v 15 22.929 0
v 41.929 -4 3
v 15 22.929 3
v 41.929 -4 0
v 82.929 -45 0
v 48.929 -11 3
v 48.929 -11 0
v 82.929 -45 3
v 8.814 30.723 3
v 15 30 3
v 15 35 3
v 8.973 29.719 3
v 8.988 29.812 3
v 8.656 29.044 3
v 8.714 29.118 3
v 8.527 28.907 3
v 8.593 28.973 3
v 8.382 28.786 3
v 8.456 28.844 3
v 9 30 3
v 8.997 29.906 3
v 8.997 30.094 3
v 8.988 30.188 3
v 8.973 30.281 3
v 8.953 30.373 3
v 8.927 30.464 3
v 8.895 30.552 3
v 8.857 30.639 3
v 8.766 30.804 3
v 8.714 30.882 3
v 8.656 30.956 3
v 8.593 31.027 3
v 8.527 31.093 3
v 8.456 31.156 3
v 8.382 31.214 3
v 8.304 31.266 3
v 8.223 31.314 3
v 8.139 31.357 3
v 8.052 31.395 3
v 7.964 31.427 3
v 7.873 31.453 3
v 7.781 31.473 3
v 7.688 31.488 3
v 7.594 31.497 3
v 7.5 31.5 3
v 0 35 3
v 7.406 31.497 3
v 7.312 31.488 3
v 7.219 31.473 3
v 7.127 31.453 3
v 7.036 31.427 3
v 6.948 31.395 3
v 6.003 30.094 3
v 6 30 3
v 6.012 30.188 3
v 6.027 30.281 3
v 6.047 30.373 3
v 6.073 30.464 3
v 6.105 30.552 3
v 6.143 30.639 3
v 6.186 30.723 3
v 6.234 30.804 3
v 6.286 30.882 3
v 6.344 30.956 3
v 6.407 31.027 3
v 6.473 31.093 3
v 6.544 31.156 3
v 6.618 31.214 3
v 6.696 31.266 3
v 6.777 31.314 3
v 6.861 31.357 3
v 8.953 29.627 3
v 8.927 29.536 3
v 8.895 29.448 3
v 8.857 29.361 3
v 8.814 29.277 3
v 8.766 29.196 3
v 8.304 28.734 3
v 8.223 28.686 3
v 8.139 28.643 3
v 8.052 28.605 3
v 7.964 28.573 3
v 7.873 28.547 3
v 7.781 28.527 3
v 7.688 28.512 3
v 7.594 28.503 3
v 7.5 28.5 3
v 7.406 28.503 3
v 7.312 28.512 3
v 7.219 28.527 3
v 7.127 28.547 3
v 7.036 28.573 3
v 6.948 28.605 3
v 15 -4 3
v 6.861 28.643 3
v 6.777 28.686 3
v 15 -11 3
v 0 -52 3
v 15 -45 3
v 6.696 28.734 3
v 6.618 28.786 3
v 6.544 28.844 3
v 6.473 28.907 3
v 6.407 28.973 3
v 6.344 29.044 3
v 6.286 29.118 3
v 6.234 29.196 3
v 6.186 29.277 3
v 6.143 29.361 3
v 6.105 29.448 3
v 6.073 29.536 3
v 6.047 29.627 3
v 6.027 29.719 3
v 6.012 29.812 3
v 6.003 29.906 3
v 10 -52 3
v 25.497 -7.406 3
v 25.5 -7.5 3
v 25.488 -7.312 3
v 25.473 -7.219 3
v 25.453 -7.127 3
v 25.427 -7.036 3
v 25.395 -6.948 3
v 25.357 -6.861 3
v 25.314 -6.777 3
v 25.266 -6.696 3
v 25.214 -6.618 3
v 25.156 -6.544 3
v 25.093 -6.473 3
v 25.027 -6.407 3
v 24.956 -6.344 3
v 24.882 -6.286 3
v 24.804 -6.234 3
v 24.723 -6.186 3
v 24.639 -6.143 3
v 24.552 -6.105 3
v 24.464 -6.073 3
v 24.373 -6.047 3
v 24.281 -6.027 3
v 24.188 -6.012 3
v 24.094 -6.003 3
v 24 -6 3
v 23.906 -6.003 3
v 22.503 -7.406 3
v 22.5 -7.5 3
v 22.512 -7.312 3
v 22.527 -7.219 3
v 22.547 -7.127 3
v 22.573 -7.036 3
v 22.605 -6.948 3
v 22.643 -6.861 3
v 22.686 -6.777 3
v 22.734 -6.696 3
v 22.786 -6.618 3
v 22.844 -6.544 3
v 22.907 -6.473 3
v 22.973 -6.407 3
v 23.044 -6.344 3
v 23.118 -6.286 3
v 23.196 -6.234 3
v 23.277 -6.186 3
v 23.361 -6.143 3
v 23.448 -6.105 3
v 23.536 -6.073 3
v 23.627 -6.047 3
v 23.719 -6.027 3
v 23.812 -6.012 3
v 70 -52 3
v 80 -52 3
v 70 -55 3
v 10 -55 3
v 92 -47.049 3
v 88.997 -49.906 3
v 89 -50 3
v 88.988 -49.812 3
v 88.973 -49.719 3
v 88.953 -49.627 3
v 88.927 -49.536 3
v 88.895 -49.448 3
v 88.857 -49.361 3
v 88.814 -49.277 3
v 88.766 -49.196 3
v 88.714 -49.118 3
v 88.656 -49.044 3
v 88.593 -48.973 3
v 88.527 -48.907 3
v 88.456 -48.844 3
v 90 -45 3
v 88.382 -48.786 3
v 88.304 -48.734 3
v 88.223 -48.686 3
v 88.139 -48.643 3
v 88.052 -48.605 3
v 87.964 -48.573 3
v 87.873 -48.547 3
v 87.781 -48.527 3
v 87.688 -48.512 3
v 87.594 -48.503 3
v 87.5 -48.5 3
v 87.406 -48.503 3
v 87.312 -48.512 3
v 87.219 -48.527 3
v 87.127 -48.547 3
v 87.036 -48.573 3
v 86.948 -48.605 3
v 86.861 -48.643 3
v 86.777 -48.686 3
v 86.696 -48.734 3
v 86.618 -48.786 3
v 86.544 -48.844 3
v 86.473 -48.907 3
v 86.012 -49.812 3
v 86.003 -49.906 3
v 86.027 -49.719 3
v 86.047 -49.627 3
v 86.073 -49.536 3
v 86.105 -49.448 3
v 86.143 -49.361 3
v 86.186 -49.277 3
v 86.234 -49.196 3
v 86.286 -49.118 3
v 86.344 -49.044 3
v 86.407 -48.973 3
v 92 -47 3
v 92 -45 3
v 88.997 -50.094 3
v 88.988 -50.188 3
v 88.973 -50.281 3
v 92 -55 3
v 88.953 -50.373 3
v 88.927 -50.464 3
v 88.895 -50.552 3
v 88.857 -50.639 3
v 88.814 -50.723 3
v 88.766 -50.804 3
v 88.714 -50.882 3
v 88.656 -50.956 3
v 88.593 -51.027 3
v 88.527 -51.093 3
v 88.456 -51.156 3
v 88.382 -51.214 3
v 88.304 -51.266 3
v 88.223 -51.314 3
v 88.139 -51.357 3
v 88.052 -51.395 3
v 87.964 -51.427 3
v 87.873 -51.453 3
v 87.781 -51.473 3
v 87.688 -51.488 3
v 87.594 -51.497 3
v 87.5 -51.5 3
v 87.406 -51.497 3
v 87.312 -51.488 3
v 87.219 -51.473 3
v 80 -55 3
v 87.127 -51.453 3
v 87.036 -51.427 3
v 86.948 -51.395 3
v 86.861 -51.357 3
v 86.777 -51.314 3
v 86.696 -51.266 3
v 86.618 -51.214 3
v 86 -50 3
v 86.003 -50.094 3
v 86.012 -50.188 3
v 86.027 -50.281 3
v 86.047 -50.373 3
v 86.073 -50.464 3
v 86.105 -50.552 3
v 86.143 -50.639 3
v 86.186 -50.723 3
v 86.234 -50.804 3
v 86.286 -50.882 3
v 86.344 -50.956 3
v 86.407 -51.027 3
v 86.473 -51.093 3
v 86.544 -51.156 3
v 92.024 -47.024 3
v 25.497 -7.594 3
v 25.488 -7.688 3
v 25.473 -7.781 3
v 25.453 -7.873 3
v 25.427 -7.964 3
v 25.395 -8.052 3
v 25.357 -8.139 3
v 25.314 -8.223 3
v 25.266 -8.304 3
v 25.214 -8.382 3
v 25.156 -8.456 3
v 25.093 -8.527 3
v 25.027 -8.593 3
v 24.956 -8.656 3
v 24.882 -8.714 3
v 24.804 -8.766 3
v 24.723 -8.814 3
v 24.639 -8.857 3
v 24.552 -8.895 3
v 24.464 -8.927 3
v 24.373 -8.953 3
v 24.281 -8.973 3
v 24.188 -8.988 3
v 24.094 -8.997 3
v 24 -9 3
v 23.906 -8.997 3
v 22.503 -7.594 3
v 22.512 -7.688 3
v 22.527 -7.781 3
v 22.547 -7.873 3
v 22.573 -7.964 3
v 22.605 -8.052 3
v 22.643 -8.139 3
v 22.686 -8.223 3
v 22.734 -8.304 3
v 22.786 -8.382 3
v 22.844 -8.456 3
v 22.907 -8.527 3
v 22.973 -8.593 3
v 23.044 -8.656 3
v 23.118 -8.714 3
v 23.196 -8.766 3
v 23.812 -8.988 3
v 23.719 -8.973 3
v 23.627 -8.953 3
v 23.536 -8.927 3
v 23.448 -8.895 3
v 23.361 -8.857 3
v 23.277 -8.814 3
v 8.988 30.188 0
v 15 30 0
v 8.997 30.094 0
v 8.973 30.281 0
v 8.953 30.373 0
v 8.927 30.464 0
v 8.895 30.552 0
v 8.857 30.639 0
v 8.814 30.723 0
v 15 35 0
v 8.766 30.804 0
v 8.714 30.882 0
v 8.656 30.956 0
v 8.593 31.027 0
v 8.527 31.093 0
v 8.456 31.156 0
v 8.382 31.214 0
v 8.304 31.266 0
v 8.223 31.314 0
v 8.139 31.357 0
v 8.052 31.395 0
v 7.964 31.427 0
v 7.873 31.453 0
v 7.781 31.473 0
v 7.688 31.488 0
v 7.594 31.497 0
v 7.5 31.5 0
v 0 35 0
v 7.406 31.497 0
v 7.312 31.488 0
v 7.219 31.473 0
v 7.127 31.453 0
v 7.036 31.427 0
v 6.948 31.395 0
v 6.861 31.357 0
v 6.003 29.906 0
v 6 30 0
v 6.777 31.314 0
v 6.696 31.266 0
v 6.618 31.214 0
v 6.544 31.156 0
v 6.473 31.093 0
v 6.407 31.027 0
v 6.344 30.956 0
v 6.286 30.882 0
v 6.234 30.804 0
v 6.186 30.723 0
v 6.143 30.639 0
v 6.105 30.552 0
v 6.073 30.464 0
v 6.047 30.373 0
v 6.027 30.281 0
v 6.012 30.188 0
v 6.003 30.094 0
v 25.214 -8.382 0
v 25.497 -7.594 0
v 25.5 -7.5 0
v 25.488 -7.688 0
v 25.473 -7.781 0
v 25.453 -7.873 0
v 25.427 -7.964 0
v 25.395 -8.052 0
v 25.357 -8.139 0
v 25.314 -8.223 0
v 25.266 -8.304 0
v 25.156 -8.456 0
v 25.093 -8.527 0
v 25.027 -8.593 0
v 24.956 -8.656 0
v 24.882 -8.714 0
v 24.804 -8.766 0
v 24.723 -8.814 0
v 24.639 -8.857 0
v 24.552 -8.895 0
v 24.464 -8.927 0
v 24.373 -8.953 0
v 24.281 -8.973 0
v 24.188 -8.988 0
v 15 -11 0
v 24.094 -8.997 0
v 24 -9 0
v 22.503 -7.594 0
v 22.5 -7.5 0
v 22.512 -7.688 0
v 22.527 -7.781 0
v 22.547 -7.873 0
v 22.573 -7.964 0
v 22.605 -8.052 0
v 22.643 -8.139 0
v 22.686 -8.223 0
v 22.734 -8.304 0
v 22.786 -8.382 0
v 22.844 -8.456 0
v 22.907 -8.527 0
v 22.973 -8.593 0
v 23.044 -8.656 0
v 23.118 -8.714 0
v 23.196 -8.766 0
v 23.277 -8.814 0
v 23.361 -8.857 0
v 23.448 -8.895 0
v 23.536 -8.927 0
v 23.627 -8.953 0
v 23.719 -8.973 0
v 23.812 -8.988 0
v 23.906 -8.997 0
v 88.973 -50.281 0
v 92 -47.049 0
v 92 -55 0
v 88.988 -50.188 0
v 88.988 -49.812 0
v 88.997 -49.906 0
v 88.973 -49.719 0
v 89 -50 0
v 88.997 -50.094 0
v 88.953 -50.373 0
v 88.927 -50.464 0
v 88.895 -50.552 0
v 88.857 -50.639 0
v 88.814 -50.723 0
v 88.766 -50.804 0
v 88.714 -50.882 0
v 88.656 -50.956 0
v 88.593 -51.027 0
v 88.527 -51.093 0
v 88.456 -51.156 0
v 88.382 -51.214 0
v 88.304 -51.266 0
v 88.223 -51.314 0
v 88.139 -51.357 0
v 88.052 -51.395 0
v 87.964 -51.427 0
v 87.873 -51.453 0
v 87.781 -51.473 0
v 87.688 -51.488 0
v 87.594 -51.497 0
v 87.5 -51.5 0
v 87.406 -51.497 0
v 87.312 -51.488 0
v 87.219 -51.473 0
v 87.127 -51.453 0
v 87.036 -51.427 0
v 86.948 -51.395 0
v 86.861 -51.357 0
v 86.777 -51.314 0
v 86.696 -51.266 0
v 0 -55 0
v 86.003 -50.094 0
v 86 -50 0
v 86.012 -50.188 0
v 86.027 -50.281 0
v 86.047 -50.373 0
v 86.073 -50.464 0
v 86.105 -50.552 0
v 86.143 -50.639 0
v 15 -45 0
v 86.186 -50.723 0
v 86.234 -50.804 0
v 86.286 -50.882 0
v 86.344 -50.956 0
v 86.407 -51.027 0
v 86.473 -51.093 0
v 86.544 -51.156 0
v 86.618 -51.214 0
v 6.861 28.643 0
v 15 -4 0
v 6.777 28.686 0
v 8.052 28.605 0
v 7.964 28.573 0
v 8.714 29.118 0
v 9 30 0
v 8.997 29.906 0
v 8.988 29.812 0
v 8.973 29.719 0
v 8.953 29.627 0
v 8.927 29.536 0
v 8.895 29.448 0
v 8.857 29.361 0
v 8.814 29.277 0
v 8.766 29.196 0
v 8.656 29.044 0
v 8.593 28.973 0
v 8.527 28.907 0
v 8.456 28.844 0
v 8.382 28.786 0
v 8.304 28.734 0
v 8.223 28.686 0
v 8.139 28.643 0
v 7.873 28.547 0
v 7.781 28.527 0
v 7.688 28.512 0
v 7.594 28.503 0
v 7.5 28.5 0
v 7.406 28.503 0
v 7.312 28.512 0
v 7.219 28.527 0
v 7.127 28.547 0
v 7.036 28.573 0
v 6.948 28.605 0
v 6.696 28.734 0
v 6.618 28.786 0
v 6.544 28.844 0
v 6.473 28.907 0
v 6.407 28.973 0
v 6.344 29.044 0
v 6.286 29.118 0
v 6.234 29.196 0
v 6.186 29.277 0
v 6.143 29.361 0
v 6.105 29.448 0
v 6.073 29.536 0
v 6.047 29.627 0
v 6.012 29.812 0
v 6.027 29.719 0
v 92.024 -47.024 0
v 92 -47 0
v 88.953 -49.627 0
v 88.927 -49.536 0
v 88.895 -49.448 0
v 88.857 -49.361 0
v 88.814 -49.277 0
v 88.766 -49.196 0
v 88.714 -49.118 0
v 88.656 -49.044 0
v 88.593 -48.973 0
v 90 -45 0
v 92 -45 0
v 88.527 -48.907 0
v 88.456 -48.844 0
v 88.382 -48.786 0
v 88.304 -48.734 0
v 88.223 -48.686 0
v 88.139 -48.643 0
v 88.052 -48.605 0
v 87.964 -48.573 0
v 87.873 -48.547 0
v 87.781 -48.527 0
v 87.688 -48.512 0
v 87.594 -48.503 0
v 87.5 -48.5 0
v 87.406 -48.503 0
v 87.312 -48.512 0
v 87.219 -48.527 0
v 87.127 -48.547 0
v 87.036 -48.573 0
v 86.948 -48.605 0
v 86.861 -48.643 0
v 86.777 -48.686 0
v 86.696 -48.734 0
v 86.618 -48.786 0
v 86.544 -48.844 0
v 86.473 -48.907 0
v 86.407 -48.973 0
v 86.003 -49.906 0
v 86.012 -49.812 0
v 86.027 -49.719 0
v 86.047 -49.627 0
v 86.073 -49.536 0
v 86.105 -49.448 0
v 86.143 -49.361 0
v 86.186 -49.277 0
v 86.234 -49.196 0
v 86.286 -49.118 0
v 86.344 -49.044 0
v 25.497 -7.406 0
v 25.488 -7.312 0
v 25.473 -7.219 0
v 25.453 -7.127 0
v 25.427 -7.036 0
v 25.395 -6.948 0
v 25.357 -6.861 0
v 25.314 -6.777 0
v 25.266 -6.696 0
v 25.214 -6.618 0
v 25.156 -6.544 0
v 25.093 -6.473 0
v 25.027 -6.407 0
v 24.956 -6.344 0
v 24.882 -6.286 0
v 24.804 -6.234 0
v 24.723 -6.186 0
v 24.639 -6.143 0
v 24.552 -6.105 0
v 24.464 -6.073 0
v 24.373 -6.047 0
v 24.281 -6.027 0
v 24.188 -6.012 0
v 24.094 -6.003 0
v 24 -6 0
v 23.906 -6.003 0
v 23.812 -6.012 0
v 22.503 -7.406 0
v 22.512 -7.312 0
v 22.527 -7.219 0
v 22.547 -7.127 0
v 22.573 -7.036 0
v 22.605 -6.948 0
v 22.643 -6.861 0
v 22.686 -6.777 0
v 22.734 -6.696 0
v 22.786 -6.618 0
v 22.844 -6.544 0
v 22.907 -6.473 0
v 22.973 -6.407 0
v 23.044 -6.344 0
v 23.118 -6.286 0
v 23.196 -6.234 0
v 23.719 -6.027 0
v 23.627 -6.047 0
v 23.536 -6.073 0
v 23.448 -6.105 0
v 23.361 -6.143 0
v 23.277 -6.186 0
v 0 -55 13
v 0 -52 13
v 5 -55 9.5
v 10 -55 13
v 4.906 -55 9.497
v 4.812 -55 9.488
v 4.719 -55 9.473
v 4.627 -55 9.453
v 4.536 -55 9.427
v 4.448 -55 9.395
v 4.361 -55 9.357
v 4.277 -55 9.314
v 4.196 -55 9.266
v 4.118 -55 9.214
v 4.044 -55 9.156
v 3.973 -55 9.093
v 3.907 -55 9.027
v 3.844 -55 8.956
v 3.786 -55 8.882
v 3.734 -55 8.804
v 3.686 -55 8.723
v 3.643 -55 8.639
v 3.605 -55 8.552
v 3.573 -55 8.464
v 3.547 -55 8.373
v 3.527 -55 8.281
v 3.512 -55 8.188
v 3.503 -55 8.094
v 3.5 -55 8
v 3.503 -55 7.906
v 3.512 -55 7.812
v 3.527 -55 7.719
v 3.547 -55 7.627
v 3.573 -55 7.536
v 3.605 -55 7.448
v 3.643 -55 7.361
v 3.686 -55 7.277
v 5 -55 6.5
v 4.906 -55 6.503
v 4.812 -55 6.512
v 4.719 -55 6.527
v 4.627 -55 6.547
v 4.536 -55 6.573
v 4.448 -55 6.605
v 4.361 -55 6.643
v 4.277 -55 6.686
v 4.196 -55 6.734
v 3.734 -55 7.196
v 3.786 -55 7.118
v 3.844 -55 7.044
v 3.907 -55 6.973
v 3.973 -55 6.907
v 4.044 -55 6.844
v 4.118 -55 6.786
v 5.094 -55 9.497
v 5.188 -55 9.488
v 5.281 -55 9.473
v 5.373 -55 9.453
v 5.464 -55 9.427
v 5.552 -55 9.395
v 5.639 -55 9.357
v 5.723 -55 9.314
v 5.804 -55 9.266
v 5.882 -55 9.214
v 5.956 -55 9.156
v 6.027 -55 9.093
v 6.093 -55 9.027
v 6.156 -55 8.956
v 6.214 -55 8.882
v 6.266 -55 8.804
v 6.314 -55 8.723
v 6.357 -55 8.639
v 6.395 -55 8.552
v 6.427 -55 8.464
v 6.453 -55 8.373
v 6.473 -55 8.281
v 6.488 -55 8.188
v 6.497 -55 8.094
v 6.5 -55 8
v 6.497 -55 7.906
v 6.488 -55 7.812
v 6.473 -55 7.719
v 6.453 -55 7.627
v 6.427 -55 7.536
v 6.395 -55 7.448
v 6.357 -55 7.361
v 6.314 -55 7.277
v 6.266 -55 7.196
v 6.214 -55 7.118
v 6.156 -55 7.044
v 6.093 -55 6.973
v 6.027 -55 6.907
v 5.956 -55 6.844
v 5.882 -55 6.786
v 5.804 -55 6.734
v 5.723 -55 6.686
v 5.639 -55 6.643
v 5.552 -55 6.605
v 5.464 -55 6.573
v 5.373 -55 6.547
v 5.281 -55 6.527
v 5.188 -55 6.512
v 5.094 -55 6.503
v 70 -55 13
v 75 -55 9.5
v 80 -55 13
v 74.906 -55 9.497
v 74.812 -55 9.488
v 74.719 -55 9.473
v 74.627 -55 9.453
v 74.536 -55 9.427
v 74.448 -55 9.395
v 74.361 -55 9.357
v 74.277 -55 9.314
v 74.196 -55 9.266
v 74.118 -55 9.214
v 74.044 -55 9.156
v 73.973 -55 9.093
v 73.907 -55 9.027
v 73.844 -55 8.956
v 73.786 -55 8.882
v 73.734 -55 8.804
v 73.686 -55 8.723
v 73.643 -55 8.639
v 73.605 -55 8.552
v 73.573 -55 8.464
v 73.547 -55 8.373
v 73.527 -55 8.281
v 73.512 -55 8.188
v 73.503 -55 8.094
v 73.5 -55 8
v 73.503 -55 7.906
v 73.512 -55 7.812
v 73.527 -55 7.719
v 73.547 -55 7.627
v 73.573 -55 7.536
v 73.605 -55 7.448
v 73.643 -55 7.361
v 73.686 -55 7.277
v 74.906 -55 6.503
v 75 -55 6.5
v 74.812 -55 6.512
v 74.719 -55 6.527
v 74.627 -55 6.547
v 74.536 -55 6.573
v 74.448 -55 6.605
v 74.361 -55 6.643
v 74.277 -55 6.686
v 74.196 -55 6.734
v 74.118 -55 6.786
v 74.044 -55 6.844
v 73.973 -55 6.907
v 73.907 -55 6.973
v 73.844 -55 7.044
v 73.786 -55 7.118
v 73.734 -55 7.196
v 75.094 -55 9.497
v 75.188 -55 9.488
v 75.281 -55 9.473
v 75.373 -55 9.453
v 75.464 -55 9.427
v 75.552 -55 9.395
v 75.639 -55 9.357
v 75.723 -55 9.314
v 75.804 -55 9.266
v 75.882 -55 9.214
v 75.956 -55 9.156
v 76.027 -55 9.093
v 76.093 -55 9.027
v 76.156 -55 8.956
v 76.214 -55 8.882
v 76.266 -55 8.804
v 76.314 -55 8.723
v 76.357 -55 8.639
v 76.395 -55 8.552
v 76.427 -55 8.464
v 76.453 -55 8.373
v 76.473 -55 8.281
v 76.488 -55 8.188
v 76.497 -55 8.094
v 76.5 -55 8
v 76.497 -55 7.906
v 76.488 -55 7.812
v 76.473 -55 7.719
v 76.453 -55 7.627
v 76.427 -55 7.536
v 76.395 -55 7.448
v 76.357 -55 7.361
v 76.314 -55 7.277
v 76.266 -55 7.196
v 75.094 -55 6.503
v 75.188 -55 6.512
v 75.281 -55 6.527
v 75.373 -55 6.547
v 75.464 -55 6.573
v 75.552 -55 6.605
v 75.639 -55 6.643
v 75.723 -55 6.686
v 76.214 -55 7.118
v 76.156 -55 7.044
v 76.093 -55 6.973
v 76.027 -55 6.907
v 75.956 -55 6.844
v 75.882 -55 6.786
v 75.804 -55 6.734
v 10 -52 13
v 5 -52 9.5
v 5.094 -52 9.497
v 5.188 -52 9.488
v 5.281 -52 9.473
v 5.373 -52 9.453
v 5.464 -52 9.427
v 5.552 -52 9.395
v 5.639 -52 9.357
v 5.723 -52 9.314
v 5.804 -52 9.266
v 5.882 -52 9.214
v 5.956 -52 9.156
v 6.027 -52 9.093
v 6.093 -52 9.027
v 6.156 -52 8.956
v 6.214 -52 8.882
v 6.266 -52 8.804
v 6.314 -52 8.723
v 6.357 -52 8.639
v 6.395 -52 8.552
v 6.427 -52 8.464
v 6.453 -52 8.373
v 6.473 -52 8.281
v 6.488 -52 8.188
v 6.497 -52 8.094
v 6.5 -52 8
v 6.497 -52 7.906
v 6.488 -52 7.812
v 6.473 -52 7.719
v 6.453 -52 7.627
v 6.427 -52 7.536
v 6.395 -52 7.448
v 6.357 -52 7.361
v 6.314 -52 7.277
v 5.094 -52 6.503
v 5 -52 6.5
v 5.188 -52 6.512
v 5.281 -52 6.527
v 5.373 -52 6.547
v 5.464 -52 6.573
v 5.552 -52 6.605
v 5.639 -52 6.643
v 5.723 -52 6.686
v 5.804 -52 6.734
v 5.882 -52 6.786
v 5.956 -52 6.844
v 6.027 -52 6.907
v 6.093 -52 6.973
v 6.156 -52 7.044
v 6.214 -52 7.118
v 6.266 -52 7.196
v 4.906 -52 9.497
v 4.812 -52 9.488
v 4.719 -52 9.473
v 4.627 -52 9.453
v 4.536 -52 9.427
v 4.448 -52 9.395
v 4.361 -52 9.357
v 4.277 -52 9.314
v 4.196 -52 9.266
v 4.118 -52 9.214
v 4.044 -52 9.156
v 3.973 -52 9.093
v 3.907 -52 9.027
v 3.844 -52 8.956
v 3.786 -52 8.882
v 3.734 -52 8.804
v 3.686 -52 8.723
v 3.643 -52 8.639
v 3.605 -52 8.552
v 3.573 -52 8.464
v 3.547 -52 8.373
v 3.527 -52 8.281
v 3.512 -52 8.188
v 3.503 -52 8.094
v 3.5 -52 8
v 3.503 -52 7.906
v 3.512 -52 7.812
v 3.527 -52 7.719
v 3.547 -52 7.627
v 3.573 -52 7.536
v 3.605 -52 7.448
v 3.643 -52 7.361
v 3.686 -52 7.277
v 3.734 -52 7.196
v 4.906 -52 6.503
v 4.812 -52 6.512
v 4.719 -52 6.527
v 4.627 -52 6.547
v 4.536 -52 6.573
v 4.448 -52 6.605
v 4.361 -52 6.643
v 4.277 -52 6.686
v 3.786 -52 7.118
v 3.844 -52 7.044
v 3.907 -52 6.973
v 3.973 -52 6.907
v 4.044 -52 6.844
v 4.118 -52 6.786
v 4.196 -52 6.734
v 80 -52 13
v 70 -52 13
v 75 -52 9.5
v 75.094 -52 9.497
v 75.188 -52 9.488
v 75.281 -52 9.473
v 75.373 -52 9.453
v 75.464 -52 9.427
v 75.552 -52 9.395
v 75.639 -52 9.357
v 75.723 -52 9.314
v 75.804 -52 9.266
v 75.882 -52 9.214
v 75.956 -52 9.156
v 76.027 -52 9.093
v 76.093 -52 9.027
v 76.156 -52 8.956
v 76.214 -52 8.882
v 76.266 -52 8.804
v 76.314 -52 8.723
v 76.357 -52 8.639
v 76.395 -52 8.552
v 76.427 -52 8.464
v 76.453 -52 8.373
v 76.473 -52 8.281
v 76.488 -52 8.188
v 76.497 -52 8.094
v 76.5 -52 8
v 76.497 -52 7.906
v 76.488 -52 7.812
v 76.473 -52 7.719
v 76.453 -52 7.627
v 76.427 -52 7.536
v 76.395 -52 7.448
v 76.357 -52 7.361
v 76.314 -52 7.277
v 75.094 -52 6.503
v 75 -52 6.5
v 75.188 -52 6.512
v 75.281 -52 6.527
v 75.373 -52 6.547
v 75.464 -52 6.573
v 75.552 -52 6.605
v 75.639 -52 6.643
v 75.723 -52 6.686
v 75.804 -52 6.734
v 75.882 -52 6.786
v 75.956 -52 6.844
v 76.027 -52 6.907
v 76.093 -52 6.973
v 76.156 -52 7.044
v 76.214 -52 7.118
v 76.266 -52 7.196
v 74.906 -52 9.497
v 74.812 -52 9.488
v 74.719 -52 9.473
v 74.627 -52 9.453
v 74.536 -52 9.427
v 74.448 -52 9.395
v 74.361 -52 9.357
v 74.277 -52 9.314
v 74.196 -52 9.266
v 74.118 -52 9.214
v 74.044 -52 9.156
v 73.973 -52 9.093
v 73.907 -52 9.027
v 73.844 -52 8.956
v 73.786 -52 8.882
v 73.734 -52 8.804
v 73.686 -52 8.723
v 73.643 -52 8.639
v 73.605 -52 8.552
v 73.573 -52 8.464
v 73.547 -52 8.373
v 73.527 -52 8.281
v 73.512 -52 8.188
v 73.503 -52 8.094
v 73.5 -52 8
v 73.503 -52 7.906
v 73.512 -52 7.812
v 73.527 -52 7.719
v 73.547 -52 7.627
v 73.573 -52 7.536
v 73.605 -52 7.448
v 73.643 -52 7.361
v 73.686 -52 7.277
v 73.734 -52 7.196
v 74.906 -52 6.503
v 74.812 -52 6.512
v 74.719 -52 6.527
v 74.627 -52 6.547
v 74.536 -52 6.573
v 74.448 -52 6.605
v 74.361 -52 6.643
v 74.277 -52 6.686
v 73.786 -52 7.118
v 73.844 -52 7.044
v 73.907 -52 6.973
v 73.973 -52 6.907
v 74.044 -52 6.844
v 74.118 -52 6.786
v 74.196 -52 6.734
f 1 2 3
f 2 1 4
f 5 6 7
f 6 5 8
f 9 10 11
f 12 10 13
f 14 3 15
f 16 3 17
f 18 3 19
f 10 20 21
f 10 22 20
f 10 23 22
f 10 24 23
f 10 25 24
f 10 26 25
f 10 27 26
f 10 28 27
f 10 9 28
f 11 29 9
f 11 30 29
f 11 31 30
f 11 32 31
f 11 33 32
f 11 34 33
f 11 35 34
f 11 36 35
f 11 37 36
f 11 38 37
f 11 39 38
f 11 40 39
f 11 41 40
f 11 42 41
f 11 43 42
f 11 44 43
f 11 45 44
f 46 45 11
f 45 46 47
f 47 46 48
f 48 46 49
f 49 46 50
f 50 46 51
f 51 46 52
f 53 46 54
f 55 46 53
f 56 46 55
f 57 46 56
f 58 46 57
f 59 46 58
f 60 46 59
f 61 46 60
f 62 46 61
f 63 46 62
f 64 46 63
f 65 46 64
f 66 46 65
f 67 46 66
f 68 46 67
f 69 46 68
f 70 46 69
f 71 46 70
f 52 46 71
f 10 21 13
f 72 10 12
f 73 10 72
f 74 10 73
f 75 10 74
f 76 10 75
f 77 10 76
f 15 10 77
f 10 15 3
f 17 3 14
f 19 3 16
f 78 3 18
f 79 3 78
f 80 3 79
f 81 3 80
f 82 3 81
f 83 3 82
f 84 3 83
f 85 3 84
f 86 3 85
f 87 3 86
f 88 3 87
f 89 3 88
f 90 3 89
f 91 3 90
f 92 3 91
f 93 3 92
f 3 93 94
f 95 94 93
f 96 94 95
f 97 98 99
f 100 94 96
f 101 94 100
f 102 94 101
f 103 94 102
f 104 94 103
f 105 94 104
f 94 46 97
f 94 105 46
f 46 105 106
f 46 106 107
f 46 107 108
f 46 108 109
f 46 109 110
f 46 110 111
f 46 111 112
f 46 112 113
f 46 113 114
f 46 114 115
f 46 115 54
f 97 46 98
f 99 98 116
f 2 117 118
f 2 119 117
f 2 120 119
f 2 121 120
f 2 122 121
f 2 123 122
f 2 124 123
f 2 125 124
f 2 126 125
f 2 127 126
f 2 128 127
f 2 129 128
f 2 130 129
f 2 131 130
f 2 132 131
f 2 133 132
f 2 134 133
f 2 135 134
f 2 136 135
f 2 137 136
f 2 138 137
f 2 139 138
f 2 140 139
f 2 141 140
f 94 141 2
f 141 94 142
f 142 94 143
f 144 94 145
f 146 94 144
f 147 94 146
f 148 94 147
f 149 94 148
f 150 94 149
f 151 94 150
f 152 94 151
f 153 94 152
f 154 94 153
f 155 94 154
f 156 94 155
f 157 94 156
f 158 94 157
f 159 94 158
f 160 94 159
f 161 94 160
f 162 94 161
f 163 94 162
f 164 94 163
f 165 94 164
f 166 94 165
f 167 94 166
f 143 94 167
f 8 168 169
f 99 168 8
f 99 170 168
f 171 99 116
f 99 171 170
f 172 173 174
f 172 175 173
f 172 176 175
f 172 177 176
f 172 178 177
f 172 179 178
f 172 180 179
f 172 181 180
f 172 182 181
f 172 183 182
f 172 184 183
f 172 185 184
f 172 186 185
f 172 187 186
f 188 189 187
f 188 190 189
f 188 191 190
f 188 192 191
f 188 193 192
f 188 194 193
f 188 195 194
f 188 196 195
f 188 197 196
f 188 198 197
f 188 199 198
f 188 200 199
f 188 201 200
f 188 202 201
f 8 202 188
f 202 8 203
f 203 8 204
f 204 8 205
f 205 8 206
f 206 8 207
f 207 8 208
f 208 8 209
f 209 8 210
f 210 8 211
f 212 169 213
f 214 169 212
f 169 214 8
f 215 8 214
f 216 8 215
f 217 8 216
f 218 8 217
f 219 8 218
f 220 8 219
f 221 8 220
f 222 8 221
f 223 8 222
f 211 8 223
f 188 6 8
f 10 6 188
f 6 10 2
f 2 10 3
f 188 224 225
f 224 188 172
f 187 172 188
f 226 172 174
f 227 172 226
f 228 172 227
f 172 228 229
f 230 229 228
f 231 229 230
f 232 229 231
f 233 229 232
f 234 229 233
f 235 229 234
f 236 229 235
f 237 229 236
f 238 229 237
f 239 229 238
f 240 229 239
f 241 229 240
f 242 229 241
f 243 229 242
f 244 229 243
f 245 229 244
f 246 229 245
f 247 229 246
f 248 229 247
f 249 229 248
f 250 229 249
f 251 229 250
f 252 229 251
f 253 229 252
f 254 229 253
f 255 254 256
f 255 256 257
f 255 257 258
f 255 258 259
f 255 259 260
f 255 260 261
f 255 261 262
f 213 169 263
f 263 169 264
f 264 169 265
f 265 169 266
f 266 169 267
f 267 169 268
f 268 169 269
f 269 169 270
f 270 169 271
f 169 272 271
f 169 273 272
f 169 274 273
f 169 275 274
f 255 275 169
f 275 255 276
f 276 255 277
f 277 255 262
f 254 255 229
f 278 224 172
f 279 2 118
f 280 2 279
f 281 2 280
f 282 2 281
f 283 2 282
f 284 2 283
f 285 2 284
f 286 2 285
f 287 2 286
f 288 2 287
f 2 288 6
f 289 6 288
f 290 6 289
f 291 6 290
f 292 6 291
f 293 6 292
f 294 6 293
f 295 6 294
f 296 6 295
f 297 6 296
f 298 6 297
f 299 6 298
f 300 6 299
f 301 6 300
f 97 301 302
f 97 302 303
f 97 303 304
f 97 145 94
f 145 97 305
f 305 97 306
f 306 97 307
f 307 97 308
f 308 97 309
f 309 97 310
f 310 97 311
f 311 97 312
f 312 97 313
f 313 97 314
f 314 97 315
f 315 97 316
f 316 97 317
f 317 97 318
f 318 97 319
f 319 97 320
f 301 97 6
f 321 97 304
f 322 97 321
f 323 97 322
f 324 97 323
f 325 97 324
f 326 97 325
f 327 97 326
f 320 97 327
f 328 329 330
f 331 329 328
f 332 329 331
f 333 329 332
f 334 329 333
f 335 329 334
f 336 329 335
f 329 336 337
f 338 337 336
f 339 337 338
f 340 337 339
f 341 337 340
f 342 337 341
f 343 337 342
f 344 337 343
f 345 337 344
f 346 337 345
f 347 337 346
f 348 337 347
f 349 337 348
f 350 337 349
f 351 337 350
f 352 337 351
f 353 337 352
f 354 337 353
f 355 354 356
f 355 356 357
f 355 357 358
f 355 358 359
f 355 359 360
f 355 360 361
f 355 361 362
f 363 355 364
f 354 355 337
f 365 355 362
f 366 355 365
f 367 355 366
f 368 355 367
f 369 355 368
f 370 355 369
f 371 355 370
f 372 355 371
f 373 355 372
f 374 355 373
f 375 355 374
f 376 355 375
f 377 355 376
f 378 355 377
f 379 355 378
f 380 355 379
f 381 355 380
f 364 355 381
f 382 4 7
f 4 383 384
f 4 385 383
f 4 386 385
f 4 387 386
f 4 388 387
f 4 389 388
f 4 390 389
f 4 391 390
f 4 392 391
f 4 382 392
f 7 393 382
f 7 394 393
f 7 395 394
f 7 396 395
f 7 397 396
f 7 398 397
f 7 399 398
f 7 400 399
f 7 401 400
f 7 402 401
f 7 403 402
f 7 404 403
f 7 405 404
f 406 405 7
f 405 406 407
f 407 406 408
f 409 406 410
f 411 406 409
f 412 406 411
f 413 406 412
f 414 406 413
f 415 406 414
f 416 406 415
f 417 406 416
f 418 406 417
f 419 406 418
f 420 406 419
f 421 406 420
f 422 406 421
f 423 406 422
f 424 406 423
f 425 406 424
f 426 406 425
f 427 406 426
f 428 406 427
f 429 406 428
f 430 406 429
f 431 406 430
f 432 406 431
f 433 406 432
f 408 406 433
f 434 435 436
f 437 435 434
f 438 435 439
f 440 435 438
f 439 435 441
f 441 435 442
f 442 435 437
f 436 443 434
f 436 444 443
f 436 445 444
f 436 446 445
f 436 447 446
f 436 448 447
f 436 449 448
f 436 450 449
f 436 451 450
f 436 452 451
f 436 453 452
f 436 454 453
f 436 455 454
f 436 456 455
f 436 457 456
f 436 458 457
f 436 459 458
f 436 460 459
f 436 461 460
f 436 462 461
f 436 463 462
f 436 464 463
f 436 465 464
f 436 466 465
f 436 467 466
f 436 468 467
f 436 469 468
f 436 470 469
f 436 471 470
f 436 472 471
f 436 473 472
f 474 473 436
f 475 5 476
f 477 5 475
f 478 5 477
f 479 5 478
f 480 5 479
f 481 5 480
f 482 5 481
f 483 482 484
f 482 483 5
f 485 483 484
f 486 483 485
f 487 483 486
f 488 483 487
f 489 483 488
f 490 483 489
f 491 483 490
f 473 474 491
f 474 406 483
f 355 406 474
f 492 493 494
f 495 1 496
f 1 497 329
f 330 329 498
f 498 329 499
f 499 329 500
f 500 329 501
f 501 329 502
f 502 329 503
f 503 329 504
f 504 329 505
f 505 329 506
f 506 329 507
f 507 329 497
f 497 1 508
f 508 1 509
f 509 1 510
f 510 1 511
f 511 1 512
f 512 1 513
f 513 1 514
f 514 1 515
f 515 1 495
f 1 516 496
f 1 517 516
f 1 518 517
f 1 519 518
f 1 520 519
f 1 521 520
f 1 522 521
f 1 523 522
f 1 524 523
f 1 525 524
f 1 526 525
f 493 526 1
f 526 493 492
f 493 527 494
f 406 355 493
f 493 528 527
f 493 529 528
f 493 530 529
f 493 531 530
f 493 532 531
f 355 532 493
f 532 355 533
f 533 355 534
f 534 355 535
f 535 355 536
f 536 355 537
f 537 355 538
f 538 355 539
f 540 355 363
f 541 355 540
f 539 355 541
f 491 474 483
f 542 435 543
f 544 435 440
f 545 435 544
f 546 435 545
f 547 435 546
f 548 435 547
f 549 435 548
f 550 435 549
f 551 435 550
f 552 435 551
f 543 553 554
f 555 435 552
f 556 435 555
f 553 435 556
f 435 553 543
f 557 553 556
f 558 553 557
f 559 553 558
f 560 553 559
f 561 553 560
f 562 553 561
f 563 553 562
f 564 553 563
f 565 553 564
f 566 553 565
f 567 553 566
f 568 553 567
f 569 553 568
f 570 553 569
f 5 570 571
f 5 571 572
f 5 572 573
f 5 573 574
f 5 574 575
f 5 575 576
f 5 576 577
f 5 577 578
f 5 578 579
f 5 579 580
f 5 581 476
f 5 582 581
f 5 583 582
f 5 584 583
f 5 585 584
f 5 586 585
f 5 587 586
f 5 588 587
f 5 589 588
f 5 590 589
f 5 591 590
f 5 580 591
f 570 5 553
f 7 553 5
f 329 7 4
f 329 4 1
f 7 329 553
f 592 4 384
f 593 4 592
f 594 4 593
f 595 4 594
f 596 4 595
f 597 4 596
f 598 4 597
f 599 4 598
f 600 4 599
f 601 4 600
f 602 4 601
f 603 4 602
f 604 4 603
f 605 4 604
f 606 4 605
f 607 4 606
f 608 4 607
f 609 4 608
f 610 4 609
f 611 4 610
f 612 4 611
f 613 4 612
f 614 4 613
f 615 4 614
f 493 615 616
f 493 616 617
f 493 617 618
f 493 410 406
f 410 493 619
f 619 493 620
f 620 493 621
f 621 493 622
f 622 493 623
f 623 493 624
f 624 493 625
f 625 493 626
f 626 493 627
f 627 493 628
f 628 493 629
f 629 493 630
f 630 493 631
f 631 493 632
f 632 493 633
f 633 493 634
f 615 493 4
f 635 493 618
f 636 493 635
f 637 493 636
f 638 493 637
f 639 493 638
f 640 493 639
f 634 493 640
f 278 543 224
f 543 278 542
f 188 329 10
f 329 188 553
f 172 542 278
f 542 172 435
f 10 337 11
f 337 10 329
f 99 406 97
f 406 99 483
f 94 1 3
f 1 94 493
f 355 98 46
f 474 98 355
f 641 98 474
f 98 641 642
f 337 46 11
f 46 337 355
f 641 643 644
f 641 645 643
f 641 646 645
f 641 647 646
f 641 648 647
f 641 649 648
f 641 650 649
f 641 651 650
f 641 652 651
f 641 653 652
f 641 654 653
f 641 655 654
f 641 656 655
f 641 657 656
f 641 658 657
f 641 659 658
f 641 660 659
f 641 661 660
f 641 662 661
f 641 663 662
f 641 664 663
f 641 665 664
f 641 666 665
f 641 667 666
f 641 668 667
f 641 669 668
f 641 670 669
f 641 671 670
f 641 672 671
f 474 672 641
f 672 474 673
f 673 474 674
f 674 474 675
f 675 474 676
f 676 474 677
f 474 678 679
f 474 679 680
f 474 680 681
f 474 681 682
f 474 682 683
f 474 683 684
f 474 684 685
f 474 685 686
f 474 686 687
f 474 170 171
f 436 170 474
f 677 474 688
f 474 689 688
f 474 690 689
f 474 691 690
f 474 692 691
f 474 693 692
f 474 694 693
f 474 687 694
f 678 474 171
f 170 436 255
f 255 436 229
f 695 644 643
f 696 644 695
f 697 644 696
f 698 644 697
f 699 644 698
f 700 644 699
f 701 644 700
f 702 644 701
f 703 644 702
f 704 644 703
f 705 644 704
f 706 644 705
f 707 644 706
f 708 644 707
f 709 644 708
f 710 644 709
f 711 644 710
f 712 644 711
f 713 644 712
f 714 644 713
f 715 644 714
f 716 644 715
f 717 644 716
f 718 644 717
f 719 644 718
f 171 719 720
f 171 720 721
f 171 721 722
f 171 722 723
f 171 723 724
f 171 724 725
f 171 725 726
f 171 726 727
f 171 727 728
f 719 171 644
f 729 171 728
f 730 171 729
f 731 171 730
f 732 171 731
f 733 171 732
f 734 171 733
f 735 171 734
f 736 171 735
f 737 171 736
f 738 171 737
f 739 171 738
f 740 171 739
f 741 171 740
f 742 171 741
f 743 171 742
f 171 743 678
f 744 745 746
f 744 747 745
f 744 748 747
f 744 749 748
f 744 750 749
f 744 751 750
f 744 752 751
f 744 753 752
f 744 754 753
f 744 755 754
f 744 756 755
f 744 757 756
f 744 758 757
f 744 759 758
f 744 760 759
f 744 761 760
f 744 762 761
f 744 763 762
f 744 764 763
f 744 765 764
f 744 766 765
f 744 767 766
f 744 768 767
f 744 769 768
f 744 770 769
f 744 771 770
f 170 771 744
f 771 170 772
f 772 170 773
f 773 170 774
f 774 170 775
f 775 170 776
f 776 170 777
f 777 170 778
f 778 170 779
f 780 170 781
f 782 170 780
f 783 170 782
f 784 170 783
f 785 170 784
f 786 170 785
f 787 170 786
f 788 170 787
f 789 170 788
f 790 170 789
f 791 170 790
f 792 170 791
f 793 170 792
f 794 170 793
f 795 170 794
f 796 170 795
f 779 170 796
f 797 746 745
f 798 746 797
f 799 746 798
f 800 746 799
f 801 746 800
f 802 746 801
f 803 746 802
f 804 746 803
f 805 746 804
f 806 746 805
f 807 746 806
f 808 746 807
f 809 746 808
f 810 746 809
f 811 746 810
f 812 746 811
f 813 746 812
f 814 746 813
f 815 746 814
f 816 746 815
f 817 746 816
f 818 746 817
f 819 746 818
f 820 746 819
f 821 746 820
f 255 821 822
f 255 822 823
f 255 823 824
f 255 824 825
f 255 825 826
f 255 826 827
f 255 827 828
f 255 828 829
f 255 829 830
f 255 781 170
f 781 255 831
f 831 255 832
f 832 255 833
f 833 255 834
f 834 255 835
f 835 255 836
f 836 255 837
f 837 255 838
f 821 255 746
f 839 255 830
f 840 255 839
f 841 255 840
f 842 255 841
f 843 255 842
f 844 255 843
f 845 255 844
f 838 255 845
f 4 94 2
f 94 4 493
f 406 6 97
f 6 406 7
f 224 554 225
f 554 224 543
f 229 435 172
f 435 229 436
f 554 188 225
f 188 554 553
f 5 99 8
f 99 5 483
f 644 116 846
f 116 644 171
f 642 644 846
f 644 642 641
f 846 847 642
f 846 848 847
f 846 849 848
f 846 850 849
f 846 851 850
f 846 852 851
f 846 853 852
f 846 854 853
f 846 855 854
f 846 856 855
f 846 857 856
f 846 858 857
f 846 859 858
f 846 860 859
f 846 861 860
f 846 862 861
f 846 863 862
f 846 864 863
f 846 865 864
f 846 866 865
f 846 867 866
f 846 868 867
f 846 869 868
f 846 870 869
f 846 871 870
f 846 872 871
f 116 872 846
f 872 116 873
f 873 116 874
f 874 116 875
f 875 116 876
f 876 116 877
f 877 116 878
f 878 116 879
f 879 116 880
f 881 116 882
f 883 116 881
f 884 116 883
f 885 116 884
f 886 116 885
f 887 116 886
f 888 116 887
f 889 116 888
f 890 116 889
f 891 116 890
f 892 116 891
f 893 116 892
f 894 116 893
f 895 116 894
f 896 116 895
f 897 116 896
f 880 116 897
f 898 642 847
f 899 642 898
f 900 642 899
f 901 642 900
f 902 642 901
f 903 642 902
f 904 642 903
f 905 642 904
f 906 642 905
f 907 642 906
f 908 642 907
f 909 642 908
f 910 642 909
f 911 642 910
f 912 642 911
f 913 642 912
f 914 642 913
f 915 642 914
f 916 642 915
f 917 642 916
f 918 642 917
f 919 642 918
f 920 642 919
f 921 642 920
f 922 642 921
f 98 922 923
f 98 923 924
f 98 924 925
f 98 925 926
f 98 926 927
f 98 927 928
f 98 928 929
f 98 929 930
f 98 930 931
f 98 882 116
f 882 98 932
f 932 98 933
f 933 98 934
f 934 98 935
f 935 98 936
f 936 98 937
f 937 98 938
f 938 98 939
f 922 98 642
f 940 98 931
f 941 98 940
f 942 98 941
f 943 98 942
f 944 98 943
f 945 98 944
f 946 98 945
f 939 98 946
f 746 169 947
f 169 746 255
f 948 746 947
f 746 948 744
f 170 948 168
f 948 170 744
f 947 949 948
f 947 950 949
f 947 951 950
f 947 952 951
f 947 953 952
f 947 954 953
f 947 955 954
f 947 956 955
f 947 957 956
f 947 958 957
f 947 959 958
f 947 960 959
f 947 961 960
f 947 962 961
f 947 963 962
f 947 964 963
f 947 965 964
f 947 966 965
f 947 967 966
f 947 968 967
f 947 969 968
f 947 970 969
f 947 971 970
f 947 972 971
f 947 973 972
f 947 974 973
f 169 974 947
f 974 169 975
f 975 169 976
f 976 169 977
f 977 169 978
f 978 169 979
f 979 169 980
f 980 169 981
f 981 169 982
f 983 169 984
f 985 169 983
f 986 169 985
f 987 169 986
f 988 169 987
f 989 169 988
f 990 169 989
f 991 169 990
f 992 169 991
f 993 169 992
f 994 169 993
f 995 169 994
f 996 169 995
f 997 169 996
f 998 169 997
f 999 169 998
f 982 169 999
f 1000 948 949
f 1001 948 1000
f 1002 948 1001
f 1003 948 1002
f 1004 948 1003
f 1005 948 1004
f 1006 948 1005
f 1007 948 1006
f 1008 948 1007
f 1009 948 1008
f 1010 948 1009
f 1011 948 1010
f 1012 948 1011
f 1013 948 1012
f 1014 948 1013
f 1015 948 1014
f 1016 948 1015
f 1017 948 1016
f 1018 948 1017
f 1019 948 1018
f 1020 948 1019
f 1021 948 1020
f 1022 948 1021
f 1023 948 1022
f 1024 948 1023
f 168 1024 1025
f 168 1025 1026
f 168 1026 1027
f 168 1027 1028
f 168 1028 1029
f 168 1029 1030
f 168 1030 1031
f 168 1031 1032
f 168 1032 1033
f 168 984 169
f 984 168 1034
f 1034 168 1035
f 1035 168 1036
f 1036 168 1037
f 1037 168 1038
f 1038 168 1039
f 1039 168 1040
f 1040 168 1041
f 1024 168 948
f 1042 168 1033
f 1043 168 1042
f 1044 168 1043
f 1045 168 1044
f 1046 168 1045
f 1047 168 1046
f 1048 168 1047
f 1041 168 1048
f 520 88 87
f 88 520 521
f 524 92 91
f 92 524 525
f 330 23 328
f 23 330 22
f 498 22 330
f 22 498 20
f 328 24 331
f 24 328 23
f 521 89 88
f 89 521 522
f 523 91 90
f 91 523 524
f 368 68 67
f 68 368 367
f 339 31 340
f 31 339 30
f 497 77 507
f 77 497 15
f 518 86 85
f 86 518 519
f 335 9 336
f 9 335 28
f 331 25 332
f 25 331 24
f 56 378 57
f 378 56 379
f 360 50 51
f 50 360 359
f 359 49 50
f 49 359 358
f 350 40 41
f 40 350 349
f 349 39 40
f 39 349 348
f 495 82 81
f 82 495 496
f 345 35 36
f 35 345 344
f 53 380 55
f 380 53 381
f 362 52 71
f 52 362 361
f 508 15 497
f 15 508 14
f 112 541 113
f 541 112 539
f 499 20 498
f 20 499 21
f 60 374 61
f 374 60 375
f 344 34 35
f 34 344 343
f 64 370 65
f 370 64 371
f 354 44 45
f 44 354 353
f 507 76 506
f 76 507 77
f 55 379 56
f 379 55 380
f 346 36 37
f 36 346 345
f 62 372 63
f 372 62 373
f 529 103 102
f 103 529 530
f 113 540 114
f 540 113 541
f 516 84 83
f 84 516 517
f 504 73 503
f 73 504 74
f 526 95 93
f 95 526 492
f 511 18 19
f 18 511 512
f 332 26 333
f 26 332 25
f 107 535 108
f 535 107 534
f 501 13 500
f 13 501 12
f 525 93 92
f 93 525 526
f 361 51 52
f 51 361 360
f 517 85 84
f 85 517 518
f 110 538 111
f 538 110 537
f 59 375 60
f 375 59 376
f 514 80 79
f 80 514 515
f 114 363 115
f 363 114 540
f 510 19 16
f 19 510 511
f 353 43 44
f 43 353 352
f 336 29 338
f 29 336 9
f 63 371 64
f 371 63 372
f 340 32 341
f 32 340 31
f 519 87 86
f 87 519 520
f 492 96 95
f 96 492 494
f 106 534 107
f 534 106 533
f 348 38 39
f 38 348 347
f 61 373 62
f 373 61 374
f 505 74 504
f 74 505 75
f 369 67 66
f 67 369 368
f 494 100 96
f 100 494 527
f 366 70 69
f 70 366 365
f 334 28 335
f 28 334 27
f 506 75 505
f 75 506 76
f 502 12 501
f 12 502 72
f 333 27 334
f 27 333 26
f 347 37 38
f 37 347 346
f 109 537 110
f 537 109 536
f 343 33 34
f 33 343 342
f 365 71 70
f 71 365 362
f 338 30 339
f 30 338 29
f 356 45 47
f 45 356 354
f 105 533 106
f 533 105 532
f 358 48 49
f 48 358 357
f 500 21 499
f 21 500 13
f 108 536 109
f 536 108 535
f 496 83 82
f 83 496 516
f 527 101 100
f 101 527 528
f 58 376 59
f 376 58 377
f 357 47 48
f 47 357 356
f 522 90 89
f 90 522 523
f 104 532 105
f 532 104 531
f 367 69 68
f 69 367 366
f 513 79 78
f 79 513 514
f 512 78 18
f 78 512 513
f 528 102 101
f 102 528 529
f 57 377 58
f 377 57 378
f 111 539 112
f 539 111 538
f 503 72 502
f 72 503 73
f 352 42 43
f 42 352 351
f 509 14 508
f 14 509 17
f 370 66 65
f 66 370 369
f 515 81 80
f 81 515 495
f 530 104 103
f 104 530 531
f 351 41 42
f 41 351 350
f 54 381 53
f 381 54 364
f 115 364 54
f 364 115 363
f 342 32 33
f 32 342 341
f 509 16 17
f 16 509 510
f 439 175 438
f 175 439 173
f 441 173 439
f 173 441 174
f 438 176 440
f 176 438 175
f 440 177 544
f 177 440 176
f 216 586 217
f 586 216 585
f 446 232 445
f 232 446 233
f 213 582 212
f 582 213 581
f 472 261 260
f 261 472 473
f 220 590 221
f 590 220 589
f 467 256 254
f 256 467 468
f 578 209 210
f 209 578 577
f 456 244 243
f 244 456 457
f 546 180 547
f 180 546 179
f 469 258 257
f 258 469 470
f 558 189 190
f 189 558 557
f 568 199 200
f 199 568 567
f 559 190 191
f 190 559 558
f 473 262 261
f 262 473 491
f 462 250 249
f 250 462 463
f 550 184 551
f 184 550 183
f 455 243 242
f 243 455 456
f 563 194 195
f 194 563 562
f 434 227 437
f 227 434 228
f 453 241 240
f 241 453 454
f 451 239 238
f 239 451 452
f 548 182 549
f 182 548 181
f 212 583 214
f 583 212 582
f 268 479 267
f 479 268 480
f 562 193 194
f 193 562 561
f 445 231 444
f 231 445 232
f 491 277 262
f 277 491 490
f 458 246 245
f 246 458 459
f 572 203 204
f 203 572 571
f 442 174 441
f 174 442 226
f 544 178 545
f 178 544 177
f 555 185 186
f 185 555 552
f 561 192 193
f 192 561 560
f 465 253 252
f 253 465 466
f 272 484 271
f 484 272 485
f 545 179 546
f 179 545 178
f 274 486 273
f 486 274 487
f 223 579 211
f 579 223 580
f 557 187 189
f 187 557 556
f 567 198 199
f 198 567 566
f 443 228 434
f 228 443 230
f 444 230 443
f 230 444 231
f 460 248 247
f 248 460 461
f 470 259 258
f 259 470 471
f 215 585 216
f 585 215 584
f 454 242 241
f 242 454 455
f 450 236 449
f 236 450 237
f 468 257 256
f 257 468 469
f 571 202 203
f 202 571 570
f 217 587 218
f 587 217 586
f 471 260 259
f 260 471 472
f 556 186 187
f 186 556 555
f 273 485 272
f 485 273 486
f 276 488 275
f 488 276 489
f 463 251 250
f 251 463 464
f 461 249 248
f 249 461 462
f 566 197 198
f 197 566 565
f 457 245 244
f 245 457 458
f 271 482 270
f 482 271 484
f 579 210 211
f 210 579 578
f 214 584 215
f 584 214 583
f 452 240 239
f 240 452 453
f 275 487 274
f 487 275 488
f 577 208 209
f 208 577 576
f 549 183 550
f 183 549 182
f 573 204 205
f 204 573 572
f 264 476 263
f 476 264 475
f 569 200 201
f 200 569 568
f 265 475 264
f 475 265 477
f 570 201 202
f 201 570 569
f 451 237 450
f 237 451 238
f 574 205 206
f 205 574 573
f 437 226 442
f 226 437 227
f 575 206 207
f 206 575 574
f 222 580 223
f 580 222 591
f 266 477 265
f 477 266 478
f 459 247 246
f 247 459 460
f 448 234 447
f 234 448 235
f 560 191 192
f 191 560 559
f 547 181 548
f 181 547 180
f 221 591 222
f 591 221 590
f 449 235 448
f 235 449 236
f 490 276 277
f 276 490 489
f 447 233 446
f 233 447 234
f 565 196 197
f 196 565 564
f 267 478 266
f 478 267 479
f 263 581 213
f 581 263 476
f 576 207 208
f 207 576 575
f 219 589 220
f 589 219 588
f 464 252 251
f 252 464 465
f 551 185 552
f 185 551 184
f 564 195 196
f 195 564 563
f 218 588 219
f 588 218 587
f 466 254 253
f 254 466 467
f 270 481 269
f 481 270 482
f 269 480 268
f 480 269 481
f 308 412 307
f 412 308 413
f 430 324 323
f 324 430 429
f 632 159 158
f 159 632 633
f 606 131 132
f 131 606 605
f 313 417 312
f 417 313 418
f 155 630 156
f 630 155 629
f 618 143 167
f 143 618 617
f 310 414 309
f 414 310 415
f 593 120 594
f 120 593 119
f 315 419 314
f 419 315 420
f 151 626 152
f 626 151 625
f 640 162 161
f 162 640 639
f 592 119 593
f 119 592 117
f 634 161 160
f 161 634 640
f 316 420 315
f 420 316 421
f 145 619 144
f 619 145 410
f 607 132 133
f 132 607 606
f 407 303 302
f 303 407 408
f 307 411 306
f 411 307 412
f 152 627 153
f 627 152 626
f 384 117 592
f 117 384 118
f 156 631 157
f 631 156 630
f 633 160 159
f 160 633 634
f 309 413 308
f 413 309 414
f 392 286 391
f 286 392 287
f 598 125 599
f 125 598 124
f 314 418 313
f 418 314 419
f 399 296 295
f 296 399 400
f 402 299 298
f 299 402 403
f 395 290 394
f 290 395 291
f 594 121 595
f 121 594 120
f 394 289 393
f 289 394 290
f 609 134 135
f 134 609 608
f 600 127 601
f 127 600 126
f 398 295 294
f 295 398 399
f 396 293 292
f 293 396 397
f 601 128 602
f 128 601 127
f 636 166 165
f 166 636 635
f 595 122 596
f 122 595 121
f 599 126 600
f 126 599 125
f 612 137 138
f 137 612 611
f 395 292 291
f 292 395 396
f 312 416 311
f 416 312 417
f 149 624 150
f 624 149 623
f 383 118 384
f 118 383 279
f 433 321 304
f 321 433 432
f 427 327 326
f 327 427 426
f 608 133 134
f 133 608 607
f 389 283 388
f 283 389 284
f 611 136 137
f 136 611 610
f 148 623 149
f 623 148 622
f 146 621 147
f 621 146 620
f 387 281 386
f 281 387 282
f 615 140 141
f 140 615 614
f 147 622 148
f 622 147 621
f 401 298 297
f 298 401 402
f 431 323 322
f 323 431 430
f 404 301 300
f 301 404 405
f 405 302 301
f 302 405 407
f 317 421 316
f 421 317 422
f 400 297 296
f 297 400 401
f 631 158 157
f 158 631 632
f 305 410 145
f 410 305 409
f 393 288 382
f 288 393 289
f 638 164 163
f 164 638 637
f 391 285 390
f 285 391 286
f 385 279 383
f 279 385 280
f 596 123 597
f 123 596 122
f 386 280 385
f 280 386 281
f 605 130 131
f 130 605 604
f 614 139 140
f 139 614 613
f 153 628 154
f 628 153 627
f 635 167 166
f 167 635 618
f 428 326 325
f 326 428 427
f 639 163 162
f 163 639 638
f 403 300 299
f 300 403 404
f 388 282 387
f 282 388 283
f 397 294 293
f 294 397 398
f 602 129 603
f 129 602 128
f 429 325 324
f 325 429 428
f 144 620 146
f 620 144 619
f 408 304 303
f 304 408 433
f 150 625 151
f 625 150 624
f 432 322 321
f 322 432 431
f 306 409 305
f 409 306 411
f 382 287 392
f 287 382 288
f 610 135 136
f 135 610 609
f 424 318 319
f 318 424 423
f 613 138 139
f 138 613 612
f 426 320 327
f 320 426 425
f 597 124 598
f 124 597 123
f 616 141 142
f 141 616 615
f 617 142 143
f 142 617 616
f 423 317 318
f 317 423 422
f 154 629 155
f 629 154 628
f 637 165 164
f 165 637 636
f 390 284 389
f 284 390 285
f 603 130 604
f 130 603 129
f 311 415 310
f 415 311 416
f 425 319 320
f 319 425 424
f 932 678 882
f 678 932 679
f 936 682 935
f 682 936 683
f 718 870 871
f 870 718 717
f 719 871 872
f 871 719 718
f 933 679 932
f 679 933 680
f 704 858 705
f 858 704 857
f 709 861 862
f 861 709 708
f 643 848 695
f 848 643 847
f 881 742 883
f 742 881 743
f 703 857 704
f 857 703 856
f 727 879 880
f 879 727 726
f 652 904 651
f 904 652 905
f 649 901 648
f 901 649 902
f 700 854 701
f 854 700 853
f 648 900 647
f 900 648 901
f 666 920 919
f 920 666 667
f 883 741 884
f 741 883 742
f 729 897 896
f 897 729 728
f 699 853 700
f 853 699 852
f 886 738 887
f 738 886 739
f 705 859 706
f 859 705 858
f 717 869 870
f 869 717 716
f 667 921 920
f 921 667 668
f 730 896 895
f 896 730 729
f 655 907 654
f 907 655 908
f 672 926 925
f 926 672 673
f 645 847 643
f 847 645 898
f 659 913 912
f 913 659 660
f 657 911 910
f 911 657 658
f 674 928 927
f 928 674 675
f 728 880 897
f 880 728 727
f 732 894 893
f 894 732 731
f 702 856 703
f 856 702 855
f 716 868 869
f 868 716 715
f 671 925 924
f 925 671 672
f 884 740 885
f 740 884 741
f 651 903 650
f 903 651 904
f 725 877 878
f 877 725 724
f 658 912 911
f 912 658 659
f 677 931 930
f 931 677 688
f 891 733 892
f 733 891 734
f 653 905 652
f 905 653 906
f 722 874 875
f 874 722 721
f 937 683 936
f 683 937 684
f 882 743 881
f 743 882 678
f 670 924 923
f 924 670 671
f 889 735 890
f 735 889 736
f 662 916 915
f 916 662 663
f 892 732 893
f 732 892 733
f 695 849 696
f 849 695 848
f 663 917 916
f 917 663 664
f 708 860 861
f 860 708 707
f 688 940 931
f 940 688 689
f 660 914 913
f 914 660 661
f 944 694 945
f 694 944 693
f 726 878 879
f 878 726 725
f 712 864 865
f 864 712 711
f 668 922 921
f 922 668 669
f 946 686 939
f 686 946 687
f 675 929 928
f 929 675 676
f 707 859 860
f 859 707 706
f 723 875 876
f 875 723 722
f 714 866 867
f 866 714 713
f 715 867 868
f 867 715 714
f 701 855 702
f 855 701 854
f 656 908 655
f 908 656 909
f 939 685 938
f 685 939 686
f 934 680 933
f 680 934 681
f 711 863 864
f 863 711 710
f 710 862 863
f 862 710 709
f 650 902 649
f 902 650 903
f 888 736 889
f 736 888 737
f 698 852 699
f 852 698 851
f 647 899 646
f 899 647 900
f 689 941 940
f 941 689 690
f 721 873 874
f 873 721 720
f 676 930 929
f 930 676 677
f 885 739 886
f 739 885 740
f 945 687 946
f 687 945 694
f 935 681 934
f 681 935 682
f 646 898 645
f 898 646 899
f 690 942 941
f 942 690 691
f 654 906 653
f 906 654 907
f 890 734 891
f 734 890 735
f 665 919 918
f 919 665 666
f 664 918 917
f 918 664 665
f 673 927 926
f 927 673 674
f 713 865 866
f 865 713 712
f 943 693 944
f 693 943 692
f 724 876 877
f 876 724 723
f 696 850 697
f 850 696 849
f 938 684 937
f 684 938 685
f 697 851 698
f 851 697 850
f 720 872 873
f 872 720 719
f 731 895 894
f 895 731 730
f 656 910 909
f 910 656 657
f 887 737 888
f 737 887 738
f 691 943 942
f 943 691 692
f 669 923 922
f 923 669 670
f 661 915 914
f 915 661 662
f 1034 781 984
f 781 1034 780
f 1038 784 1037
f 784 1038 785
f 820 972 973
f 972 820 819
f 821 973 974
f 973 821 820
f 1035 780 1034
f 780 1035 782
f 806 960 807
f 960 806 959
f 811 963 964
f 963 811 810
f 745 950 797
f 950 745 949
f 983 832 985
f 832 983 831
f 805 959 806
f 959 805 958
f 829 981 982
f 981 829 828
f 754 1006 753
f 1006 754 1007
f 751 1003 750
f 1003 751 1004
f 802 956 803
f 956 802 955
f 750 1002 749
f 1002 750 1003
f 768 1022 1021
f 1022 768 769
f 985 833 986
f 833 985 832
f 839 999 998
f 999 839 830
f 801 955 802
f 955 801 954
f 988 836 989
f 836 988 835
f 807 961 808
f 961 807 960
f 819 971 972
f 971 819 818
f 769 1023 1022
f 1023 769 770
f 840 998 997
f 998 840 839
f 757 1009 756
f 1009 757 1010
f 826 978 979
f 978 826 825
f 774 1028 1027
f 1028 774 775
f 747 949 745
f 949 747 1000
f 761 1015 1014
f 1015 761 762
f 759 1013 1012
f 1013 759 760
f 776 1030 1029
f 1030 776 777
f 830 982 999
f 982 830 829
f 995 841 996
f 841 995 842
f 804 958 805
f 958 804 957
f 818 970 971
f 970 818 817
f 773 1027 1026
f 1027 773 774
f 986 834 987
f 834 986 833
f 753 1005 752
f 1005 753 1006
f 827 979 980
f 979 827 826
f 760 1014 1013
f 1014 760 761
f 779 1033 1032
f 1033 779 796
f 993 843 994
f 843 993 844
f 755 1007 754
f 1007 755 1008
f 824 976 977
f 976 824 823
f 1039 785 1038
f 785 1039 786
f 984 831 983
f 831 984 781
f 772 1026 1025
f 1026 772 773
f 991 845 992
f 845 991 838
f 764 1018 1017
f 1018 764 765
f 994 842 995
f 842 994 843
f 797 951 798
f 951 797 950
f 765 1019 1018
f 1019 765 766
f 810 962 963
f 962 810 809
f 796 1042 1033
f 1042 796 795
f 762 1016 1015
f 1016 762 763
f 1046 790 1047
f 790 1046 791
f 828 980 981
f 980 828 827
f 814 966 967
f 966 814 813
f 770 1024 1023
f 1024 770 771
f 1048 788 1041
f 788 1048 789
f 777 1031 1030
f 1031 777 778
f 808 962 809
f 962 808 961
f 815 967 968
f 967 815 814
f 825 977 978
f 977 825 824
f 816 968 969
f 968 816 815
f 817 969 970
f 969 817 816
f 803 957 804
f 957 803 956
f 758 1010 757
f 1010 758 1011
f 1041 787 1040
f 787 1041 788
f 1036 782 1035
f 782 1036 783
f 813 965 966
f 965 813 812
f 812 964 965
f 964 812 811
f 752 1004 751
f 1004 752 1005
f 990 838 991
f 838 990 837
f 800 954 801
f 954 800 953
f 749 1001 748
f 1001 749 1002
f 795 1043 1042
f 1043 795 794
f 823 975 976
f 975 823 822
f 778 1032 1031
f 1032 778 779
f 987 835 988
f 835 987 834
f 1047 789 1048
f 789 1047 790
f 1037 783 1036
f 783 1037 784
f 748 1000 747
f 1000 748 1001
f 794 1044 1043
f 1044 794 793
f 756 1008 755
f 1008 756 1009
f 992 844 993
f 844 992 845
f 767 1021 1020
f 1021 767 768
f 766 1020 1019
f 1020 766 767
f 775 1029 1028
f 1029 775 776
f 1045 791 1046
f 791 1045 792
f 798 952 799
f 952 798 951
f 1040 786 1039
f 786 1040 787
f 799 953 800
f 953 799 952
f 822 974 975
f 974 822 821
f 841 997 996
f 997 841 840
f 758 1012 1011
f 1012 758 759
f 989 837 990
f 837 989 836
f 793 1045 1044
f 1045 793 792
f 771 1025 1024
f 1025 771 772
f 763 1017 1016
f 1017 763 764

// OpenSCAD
      
dikte = 3;

difference(){
	union(){   
       
        translate([10,35,0]){
           rotate(a = [0,0,-135]) {
             cube([5,116,dikte], center=false);
           }
        }

        translate([0,-55,0]){
           cube([15,90,dikte], center=false);
        }
     
        translate([0,-11,0]){
           cube([49,7,dikte], center=false);
        }
        translate([0,-55,0]){
           cube([92,10,dikte], center=false);
        }
        translate([0,-55,0]){
           cube([10,3,13], center=false);
        }
        translate([70,-55,0]){
           cube([10,3,13], center=false);
        }


        
	}
	union() {

/* gaten in as */
        translate([7.5,30,-10]){
            rotate(a = [0,0,0]) {
                cylinder(h=400, r=1.5, $fn=100, center=false);
            }
        }	
        translate([87.5,-50,-10]){
            rotate(a = [0,0,0]) {
                cylinder(h=400, r=1.5, $fn=100, center=false);
            }
        }	
        translate([24,-7.5,-10]){
            rotate(a = [0,0,0]) {
                cylinder(h=400, r=1.5, $fn=100, center=false);
            }
        }	
        translate([5,30,8]){
            rotate(a = [90,0,0]) {
                cylinder(h=400, r=1.5, $fn=100, center=false);
            }
        }	
        translate([75,30,8]){
            rotate(a = [90,0,0]) {
                cylinder(h=400, r=1.5, $fn=100, center=false);
            }
        }	
        
	}
}
